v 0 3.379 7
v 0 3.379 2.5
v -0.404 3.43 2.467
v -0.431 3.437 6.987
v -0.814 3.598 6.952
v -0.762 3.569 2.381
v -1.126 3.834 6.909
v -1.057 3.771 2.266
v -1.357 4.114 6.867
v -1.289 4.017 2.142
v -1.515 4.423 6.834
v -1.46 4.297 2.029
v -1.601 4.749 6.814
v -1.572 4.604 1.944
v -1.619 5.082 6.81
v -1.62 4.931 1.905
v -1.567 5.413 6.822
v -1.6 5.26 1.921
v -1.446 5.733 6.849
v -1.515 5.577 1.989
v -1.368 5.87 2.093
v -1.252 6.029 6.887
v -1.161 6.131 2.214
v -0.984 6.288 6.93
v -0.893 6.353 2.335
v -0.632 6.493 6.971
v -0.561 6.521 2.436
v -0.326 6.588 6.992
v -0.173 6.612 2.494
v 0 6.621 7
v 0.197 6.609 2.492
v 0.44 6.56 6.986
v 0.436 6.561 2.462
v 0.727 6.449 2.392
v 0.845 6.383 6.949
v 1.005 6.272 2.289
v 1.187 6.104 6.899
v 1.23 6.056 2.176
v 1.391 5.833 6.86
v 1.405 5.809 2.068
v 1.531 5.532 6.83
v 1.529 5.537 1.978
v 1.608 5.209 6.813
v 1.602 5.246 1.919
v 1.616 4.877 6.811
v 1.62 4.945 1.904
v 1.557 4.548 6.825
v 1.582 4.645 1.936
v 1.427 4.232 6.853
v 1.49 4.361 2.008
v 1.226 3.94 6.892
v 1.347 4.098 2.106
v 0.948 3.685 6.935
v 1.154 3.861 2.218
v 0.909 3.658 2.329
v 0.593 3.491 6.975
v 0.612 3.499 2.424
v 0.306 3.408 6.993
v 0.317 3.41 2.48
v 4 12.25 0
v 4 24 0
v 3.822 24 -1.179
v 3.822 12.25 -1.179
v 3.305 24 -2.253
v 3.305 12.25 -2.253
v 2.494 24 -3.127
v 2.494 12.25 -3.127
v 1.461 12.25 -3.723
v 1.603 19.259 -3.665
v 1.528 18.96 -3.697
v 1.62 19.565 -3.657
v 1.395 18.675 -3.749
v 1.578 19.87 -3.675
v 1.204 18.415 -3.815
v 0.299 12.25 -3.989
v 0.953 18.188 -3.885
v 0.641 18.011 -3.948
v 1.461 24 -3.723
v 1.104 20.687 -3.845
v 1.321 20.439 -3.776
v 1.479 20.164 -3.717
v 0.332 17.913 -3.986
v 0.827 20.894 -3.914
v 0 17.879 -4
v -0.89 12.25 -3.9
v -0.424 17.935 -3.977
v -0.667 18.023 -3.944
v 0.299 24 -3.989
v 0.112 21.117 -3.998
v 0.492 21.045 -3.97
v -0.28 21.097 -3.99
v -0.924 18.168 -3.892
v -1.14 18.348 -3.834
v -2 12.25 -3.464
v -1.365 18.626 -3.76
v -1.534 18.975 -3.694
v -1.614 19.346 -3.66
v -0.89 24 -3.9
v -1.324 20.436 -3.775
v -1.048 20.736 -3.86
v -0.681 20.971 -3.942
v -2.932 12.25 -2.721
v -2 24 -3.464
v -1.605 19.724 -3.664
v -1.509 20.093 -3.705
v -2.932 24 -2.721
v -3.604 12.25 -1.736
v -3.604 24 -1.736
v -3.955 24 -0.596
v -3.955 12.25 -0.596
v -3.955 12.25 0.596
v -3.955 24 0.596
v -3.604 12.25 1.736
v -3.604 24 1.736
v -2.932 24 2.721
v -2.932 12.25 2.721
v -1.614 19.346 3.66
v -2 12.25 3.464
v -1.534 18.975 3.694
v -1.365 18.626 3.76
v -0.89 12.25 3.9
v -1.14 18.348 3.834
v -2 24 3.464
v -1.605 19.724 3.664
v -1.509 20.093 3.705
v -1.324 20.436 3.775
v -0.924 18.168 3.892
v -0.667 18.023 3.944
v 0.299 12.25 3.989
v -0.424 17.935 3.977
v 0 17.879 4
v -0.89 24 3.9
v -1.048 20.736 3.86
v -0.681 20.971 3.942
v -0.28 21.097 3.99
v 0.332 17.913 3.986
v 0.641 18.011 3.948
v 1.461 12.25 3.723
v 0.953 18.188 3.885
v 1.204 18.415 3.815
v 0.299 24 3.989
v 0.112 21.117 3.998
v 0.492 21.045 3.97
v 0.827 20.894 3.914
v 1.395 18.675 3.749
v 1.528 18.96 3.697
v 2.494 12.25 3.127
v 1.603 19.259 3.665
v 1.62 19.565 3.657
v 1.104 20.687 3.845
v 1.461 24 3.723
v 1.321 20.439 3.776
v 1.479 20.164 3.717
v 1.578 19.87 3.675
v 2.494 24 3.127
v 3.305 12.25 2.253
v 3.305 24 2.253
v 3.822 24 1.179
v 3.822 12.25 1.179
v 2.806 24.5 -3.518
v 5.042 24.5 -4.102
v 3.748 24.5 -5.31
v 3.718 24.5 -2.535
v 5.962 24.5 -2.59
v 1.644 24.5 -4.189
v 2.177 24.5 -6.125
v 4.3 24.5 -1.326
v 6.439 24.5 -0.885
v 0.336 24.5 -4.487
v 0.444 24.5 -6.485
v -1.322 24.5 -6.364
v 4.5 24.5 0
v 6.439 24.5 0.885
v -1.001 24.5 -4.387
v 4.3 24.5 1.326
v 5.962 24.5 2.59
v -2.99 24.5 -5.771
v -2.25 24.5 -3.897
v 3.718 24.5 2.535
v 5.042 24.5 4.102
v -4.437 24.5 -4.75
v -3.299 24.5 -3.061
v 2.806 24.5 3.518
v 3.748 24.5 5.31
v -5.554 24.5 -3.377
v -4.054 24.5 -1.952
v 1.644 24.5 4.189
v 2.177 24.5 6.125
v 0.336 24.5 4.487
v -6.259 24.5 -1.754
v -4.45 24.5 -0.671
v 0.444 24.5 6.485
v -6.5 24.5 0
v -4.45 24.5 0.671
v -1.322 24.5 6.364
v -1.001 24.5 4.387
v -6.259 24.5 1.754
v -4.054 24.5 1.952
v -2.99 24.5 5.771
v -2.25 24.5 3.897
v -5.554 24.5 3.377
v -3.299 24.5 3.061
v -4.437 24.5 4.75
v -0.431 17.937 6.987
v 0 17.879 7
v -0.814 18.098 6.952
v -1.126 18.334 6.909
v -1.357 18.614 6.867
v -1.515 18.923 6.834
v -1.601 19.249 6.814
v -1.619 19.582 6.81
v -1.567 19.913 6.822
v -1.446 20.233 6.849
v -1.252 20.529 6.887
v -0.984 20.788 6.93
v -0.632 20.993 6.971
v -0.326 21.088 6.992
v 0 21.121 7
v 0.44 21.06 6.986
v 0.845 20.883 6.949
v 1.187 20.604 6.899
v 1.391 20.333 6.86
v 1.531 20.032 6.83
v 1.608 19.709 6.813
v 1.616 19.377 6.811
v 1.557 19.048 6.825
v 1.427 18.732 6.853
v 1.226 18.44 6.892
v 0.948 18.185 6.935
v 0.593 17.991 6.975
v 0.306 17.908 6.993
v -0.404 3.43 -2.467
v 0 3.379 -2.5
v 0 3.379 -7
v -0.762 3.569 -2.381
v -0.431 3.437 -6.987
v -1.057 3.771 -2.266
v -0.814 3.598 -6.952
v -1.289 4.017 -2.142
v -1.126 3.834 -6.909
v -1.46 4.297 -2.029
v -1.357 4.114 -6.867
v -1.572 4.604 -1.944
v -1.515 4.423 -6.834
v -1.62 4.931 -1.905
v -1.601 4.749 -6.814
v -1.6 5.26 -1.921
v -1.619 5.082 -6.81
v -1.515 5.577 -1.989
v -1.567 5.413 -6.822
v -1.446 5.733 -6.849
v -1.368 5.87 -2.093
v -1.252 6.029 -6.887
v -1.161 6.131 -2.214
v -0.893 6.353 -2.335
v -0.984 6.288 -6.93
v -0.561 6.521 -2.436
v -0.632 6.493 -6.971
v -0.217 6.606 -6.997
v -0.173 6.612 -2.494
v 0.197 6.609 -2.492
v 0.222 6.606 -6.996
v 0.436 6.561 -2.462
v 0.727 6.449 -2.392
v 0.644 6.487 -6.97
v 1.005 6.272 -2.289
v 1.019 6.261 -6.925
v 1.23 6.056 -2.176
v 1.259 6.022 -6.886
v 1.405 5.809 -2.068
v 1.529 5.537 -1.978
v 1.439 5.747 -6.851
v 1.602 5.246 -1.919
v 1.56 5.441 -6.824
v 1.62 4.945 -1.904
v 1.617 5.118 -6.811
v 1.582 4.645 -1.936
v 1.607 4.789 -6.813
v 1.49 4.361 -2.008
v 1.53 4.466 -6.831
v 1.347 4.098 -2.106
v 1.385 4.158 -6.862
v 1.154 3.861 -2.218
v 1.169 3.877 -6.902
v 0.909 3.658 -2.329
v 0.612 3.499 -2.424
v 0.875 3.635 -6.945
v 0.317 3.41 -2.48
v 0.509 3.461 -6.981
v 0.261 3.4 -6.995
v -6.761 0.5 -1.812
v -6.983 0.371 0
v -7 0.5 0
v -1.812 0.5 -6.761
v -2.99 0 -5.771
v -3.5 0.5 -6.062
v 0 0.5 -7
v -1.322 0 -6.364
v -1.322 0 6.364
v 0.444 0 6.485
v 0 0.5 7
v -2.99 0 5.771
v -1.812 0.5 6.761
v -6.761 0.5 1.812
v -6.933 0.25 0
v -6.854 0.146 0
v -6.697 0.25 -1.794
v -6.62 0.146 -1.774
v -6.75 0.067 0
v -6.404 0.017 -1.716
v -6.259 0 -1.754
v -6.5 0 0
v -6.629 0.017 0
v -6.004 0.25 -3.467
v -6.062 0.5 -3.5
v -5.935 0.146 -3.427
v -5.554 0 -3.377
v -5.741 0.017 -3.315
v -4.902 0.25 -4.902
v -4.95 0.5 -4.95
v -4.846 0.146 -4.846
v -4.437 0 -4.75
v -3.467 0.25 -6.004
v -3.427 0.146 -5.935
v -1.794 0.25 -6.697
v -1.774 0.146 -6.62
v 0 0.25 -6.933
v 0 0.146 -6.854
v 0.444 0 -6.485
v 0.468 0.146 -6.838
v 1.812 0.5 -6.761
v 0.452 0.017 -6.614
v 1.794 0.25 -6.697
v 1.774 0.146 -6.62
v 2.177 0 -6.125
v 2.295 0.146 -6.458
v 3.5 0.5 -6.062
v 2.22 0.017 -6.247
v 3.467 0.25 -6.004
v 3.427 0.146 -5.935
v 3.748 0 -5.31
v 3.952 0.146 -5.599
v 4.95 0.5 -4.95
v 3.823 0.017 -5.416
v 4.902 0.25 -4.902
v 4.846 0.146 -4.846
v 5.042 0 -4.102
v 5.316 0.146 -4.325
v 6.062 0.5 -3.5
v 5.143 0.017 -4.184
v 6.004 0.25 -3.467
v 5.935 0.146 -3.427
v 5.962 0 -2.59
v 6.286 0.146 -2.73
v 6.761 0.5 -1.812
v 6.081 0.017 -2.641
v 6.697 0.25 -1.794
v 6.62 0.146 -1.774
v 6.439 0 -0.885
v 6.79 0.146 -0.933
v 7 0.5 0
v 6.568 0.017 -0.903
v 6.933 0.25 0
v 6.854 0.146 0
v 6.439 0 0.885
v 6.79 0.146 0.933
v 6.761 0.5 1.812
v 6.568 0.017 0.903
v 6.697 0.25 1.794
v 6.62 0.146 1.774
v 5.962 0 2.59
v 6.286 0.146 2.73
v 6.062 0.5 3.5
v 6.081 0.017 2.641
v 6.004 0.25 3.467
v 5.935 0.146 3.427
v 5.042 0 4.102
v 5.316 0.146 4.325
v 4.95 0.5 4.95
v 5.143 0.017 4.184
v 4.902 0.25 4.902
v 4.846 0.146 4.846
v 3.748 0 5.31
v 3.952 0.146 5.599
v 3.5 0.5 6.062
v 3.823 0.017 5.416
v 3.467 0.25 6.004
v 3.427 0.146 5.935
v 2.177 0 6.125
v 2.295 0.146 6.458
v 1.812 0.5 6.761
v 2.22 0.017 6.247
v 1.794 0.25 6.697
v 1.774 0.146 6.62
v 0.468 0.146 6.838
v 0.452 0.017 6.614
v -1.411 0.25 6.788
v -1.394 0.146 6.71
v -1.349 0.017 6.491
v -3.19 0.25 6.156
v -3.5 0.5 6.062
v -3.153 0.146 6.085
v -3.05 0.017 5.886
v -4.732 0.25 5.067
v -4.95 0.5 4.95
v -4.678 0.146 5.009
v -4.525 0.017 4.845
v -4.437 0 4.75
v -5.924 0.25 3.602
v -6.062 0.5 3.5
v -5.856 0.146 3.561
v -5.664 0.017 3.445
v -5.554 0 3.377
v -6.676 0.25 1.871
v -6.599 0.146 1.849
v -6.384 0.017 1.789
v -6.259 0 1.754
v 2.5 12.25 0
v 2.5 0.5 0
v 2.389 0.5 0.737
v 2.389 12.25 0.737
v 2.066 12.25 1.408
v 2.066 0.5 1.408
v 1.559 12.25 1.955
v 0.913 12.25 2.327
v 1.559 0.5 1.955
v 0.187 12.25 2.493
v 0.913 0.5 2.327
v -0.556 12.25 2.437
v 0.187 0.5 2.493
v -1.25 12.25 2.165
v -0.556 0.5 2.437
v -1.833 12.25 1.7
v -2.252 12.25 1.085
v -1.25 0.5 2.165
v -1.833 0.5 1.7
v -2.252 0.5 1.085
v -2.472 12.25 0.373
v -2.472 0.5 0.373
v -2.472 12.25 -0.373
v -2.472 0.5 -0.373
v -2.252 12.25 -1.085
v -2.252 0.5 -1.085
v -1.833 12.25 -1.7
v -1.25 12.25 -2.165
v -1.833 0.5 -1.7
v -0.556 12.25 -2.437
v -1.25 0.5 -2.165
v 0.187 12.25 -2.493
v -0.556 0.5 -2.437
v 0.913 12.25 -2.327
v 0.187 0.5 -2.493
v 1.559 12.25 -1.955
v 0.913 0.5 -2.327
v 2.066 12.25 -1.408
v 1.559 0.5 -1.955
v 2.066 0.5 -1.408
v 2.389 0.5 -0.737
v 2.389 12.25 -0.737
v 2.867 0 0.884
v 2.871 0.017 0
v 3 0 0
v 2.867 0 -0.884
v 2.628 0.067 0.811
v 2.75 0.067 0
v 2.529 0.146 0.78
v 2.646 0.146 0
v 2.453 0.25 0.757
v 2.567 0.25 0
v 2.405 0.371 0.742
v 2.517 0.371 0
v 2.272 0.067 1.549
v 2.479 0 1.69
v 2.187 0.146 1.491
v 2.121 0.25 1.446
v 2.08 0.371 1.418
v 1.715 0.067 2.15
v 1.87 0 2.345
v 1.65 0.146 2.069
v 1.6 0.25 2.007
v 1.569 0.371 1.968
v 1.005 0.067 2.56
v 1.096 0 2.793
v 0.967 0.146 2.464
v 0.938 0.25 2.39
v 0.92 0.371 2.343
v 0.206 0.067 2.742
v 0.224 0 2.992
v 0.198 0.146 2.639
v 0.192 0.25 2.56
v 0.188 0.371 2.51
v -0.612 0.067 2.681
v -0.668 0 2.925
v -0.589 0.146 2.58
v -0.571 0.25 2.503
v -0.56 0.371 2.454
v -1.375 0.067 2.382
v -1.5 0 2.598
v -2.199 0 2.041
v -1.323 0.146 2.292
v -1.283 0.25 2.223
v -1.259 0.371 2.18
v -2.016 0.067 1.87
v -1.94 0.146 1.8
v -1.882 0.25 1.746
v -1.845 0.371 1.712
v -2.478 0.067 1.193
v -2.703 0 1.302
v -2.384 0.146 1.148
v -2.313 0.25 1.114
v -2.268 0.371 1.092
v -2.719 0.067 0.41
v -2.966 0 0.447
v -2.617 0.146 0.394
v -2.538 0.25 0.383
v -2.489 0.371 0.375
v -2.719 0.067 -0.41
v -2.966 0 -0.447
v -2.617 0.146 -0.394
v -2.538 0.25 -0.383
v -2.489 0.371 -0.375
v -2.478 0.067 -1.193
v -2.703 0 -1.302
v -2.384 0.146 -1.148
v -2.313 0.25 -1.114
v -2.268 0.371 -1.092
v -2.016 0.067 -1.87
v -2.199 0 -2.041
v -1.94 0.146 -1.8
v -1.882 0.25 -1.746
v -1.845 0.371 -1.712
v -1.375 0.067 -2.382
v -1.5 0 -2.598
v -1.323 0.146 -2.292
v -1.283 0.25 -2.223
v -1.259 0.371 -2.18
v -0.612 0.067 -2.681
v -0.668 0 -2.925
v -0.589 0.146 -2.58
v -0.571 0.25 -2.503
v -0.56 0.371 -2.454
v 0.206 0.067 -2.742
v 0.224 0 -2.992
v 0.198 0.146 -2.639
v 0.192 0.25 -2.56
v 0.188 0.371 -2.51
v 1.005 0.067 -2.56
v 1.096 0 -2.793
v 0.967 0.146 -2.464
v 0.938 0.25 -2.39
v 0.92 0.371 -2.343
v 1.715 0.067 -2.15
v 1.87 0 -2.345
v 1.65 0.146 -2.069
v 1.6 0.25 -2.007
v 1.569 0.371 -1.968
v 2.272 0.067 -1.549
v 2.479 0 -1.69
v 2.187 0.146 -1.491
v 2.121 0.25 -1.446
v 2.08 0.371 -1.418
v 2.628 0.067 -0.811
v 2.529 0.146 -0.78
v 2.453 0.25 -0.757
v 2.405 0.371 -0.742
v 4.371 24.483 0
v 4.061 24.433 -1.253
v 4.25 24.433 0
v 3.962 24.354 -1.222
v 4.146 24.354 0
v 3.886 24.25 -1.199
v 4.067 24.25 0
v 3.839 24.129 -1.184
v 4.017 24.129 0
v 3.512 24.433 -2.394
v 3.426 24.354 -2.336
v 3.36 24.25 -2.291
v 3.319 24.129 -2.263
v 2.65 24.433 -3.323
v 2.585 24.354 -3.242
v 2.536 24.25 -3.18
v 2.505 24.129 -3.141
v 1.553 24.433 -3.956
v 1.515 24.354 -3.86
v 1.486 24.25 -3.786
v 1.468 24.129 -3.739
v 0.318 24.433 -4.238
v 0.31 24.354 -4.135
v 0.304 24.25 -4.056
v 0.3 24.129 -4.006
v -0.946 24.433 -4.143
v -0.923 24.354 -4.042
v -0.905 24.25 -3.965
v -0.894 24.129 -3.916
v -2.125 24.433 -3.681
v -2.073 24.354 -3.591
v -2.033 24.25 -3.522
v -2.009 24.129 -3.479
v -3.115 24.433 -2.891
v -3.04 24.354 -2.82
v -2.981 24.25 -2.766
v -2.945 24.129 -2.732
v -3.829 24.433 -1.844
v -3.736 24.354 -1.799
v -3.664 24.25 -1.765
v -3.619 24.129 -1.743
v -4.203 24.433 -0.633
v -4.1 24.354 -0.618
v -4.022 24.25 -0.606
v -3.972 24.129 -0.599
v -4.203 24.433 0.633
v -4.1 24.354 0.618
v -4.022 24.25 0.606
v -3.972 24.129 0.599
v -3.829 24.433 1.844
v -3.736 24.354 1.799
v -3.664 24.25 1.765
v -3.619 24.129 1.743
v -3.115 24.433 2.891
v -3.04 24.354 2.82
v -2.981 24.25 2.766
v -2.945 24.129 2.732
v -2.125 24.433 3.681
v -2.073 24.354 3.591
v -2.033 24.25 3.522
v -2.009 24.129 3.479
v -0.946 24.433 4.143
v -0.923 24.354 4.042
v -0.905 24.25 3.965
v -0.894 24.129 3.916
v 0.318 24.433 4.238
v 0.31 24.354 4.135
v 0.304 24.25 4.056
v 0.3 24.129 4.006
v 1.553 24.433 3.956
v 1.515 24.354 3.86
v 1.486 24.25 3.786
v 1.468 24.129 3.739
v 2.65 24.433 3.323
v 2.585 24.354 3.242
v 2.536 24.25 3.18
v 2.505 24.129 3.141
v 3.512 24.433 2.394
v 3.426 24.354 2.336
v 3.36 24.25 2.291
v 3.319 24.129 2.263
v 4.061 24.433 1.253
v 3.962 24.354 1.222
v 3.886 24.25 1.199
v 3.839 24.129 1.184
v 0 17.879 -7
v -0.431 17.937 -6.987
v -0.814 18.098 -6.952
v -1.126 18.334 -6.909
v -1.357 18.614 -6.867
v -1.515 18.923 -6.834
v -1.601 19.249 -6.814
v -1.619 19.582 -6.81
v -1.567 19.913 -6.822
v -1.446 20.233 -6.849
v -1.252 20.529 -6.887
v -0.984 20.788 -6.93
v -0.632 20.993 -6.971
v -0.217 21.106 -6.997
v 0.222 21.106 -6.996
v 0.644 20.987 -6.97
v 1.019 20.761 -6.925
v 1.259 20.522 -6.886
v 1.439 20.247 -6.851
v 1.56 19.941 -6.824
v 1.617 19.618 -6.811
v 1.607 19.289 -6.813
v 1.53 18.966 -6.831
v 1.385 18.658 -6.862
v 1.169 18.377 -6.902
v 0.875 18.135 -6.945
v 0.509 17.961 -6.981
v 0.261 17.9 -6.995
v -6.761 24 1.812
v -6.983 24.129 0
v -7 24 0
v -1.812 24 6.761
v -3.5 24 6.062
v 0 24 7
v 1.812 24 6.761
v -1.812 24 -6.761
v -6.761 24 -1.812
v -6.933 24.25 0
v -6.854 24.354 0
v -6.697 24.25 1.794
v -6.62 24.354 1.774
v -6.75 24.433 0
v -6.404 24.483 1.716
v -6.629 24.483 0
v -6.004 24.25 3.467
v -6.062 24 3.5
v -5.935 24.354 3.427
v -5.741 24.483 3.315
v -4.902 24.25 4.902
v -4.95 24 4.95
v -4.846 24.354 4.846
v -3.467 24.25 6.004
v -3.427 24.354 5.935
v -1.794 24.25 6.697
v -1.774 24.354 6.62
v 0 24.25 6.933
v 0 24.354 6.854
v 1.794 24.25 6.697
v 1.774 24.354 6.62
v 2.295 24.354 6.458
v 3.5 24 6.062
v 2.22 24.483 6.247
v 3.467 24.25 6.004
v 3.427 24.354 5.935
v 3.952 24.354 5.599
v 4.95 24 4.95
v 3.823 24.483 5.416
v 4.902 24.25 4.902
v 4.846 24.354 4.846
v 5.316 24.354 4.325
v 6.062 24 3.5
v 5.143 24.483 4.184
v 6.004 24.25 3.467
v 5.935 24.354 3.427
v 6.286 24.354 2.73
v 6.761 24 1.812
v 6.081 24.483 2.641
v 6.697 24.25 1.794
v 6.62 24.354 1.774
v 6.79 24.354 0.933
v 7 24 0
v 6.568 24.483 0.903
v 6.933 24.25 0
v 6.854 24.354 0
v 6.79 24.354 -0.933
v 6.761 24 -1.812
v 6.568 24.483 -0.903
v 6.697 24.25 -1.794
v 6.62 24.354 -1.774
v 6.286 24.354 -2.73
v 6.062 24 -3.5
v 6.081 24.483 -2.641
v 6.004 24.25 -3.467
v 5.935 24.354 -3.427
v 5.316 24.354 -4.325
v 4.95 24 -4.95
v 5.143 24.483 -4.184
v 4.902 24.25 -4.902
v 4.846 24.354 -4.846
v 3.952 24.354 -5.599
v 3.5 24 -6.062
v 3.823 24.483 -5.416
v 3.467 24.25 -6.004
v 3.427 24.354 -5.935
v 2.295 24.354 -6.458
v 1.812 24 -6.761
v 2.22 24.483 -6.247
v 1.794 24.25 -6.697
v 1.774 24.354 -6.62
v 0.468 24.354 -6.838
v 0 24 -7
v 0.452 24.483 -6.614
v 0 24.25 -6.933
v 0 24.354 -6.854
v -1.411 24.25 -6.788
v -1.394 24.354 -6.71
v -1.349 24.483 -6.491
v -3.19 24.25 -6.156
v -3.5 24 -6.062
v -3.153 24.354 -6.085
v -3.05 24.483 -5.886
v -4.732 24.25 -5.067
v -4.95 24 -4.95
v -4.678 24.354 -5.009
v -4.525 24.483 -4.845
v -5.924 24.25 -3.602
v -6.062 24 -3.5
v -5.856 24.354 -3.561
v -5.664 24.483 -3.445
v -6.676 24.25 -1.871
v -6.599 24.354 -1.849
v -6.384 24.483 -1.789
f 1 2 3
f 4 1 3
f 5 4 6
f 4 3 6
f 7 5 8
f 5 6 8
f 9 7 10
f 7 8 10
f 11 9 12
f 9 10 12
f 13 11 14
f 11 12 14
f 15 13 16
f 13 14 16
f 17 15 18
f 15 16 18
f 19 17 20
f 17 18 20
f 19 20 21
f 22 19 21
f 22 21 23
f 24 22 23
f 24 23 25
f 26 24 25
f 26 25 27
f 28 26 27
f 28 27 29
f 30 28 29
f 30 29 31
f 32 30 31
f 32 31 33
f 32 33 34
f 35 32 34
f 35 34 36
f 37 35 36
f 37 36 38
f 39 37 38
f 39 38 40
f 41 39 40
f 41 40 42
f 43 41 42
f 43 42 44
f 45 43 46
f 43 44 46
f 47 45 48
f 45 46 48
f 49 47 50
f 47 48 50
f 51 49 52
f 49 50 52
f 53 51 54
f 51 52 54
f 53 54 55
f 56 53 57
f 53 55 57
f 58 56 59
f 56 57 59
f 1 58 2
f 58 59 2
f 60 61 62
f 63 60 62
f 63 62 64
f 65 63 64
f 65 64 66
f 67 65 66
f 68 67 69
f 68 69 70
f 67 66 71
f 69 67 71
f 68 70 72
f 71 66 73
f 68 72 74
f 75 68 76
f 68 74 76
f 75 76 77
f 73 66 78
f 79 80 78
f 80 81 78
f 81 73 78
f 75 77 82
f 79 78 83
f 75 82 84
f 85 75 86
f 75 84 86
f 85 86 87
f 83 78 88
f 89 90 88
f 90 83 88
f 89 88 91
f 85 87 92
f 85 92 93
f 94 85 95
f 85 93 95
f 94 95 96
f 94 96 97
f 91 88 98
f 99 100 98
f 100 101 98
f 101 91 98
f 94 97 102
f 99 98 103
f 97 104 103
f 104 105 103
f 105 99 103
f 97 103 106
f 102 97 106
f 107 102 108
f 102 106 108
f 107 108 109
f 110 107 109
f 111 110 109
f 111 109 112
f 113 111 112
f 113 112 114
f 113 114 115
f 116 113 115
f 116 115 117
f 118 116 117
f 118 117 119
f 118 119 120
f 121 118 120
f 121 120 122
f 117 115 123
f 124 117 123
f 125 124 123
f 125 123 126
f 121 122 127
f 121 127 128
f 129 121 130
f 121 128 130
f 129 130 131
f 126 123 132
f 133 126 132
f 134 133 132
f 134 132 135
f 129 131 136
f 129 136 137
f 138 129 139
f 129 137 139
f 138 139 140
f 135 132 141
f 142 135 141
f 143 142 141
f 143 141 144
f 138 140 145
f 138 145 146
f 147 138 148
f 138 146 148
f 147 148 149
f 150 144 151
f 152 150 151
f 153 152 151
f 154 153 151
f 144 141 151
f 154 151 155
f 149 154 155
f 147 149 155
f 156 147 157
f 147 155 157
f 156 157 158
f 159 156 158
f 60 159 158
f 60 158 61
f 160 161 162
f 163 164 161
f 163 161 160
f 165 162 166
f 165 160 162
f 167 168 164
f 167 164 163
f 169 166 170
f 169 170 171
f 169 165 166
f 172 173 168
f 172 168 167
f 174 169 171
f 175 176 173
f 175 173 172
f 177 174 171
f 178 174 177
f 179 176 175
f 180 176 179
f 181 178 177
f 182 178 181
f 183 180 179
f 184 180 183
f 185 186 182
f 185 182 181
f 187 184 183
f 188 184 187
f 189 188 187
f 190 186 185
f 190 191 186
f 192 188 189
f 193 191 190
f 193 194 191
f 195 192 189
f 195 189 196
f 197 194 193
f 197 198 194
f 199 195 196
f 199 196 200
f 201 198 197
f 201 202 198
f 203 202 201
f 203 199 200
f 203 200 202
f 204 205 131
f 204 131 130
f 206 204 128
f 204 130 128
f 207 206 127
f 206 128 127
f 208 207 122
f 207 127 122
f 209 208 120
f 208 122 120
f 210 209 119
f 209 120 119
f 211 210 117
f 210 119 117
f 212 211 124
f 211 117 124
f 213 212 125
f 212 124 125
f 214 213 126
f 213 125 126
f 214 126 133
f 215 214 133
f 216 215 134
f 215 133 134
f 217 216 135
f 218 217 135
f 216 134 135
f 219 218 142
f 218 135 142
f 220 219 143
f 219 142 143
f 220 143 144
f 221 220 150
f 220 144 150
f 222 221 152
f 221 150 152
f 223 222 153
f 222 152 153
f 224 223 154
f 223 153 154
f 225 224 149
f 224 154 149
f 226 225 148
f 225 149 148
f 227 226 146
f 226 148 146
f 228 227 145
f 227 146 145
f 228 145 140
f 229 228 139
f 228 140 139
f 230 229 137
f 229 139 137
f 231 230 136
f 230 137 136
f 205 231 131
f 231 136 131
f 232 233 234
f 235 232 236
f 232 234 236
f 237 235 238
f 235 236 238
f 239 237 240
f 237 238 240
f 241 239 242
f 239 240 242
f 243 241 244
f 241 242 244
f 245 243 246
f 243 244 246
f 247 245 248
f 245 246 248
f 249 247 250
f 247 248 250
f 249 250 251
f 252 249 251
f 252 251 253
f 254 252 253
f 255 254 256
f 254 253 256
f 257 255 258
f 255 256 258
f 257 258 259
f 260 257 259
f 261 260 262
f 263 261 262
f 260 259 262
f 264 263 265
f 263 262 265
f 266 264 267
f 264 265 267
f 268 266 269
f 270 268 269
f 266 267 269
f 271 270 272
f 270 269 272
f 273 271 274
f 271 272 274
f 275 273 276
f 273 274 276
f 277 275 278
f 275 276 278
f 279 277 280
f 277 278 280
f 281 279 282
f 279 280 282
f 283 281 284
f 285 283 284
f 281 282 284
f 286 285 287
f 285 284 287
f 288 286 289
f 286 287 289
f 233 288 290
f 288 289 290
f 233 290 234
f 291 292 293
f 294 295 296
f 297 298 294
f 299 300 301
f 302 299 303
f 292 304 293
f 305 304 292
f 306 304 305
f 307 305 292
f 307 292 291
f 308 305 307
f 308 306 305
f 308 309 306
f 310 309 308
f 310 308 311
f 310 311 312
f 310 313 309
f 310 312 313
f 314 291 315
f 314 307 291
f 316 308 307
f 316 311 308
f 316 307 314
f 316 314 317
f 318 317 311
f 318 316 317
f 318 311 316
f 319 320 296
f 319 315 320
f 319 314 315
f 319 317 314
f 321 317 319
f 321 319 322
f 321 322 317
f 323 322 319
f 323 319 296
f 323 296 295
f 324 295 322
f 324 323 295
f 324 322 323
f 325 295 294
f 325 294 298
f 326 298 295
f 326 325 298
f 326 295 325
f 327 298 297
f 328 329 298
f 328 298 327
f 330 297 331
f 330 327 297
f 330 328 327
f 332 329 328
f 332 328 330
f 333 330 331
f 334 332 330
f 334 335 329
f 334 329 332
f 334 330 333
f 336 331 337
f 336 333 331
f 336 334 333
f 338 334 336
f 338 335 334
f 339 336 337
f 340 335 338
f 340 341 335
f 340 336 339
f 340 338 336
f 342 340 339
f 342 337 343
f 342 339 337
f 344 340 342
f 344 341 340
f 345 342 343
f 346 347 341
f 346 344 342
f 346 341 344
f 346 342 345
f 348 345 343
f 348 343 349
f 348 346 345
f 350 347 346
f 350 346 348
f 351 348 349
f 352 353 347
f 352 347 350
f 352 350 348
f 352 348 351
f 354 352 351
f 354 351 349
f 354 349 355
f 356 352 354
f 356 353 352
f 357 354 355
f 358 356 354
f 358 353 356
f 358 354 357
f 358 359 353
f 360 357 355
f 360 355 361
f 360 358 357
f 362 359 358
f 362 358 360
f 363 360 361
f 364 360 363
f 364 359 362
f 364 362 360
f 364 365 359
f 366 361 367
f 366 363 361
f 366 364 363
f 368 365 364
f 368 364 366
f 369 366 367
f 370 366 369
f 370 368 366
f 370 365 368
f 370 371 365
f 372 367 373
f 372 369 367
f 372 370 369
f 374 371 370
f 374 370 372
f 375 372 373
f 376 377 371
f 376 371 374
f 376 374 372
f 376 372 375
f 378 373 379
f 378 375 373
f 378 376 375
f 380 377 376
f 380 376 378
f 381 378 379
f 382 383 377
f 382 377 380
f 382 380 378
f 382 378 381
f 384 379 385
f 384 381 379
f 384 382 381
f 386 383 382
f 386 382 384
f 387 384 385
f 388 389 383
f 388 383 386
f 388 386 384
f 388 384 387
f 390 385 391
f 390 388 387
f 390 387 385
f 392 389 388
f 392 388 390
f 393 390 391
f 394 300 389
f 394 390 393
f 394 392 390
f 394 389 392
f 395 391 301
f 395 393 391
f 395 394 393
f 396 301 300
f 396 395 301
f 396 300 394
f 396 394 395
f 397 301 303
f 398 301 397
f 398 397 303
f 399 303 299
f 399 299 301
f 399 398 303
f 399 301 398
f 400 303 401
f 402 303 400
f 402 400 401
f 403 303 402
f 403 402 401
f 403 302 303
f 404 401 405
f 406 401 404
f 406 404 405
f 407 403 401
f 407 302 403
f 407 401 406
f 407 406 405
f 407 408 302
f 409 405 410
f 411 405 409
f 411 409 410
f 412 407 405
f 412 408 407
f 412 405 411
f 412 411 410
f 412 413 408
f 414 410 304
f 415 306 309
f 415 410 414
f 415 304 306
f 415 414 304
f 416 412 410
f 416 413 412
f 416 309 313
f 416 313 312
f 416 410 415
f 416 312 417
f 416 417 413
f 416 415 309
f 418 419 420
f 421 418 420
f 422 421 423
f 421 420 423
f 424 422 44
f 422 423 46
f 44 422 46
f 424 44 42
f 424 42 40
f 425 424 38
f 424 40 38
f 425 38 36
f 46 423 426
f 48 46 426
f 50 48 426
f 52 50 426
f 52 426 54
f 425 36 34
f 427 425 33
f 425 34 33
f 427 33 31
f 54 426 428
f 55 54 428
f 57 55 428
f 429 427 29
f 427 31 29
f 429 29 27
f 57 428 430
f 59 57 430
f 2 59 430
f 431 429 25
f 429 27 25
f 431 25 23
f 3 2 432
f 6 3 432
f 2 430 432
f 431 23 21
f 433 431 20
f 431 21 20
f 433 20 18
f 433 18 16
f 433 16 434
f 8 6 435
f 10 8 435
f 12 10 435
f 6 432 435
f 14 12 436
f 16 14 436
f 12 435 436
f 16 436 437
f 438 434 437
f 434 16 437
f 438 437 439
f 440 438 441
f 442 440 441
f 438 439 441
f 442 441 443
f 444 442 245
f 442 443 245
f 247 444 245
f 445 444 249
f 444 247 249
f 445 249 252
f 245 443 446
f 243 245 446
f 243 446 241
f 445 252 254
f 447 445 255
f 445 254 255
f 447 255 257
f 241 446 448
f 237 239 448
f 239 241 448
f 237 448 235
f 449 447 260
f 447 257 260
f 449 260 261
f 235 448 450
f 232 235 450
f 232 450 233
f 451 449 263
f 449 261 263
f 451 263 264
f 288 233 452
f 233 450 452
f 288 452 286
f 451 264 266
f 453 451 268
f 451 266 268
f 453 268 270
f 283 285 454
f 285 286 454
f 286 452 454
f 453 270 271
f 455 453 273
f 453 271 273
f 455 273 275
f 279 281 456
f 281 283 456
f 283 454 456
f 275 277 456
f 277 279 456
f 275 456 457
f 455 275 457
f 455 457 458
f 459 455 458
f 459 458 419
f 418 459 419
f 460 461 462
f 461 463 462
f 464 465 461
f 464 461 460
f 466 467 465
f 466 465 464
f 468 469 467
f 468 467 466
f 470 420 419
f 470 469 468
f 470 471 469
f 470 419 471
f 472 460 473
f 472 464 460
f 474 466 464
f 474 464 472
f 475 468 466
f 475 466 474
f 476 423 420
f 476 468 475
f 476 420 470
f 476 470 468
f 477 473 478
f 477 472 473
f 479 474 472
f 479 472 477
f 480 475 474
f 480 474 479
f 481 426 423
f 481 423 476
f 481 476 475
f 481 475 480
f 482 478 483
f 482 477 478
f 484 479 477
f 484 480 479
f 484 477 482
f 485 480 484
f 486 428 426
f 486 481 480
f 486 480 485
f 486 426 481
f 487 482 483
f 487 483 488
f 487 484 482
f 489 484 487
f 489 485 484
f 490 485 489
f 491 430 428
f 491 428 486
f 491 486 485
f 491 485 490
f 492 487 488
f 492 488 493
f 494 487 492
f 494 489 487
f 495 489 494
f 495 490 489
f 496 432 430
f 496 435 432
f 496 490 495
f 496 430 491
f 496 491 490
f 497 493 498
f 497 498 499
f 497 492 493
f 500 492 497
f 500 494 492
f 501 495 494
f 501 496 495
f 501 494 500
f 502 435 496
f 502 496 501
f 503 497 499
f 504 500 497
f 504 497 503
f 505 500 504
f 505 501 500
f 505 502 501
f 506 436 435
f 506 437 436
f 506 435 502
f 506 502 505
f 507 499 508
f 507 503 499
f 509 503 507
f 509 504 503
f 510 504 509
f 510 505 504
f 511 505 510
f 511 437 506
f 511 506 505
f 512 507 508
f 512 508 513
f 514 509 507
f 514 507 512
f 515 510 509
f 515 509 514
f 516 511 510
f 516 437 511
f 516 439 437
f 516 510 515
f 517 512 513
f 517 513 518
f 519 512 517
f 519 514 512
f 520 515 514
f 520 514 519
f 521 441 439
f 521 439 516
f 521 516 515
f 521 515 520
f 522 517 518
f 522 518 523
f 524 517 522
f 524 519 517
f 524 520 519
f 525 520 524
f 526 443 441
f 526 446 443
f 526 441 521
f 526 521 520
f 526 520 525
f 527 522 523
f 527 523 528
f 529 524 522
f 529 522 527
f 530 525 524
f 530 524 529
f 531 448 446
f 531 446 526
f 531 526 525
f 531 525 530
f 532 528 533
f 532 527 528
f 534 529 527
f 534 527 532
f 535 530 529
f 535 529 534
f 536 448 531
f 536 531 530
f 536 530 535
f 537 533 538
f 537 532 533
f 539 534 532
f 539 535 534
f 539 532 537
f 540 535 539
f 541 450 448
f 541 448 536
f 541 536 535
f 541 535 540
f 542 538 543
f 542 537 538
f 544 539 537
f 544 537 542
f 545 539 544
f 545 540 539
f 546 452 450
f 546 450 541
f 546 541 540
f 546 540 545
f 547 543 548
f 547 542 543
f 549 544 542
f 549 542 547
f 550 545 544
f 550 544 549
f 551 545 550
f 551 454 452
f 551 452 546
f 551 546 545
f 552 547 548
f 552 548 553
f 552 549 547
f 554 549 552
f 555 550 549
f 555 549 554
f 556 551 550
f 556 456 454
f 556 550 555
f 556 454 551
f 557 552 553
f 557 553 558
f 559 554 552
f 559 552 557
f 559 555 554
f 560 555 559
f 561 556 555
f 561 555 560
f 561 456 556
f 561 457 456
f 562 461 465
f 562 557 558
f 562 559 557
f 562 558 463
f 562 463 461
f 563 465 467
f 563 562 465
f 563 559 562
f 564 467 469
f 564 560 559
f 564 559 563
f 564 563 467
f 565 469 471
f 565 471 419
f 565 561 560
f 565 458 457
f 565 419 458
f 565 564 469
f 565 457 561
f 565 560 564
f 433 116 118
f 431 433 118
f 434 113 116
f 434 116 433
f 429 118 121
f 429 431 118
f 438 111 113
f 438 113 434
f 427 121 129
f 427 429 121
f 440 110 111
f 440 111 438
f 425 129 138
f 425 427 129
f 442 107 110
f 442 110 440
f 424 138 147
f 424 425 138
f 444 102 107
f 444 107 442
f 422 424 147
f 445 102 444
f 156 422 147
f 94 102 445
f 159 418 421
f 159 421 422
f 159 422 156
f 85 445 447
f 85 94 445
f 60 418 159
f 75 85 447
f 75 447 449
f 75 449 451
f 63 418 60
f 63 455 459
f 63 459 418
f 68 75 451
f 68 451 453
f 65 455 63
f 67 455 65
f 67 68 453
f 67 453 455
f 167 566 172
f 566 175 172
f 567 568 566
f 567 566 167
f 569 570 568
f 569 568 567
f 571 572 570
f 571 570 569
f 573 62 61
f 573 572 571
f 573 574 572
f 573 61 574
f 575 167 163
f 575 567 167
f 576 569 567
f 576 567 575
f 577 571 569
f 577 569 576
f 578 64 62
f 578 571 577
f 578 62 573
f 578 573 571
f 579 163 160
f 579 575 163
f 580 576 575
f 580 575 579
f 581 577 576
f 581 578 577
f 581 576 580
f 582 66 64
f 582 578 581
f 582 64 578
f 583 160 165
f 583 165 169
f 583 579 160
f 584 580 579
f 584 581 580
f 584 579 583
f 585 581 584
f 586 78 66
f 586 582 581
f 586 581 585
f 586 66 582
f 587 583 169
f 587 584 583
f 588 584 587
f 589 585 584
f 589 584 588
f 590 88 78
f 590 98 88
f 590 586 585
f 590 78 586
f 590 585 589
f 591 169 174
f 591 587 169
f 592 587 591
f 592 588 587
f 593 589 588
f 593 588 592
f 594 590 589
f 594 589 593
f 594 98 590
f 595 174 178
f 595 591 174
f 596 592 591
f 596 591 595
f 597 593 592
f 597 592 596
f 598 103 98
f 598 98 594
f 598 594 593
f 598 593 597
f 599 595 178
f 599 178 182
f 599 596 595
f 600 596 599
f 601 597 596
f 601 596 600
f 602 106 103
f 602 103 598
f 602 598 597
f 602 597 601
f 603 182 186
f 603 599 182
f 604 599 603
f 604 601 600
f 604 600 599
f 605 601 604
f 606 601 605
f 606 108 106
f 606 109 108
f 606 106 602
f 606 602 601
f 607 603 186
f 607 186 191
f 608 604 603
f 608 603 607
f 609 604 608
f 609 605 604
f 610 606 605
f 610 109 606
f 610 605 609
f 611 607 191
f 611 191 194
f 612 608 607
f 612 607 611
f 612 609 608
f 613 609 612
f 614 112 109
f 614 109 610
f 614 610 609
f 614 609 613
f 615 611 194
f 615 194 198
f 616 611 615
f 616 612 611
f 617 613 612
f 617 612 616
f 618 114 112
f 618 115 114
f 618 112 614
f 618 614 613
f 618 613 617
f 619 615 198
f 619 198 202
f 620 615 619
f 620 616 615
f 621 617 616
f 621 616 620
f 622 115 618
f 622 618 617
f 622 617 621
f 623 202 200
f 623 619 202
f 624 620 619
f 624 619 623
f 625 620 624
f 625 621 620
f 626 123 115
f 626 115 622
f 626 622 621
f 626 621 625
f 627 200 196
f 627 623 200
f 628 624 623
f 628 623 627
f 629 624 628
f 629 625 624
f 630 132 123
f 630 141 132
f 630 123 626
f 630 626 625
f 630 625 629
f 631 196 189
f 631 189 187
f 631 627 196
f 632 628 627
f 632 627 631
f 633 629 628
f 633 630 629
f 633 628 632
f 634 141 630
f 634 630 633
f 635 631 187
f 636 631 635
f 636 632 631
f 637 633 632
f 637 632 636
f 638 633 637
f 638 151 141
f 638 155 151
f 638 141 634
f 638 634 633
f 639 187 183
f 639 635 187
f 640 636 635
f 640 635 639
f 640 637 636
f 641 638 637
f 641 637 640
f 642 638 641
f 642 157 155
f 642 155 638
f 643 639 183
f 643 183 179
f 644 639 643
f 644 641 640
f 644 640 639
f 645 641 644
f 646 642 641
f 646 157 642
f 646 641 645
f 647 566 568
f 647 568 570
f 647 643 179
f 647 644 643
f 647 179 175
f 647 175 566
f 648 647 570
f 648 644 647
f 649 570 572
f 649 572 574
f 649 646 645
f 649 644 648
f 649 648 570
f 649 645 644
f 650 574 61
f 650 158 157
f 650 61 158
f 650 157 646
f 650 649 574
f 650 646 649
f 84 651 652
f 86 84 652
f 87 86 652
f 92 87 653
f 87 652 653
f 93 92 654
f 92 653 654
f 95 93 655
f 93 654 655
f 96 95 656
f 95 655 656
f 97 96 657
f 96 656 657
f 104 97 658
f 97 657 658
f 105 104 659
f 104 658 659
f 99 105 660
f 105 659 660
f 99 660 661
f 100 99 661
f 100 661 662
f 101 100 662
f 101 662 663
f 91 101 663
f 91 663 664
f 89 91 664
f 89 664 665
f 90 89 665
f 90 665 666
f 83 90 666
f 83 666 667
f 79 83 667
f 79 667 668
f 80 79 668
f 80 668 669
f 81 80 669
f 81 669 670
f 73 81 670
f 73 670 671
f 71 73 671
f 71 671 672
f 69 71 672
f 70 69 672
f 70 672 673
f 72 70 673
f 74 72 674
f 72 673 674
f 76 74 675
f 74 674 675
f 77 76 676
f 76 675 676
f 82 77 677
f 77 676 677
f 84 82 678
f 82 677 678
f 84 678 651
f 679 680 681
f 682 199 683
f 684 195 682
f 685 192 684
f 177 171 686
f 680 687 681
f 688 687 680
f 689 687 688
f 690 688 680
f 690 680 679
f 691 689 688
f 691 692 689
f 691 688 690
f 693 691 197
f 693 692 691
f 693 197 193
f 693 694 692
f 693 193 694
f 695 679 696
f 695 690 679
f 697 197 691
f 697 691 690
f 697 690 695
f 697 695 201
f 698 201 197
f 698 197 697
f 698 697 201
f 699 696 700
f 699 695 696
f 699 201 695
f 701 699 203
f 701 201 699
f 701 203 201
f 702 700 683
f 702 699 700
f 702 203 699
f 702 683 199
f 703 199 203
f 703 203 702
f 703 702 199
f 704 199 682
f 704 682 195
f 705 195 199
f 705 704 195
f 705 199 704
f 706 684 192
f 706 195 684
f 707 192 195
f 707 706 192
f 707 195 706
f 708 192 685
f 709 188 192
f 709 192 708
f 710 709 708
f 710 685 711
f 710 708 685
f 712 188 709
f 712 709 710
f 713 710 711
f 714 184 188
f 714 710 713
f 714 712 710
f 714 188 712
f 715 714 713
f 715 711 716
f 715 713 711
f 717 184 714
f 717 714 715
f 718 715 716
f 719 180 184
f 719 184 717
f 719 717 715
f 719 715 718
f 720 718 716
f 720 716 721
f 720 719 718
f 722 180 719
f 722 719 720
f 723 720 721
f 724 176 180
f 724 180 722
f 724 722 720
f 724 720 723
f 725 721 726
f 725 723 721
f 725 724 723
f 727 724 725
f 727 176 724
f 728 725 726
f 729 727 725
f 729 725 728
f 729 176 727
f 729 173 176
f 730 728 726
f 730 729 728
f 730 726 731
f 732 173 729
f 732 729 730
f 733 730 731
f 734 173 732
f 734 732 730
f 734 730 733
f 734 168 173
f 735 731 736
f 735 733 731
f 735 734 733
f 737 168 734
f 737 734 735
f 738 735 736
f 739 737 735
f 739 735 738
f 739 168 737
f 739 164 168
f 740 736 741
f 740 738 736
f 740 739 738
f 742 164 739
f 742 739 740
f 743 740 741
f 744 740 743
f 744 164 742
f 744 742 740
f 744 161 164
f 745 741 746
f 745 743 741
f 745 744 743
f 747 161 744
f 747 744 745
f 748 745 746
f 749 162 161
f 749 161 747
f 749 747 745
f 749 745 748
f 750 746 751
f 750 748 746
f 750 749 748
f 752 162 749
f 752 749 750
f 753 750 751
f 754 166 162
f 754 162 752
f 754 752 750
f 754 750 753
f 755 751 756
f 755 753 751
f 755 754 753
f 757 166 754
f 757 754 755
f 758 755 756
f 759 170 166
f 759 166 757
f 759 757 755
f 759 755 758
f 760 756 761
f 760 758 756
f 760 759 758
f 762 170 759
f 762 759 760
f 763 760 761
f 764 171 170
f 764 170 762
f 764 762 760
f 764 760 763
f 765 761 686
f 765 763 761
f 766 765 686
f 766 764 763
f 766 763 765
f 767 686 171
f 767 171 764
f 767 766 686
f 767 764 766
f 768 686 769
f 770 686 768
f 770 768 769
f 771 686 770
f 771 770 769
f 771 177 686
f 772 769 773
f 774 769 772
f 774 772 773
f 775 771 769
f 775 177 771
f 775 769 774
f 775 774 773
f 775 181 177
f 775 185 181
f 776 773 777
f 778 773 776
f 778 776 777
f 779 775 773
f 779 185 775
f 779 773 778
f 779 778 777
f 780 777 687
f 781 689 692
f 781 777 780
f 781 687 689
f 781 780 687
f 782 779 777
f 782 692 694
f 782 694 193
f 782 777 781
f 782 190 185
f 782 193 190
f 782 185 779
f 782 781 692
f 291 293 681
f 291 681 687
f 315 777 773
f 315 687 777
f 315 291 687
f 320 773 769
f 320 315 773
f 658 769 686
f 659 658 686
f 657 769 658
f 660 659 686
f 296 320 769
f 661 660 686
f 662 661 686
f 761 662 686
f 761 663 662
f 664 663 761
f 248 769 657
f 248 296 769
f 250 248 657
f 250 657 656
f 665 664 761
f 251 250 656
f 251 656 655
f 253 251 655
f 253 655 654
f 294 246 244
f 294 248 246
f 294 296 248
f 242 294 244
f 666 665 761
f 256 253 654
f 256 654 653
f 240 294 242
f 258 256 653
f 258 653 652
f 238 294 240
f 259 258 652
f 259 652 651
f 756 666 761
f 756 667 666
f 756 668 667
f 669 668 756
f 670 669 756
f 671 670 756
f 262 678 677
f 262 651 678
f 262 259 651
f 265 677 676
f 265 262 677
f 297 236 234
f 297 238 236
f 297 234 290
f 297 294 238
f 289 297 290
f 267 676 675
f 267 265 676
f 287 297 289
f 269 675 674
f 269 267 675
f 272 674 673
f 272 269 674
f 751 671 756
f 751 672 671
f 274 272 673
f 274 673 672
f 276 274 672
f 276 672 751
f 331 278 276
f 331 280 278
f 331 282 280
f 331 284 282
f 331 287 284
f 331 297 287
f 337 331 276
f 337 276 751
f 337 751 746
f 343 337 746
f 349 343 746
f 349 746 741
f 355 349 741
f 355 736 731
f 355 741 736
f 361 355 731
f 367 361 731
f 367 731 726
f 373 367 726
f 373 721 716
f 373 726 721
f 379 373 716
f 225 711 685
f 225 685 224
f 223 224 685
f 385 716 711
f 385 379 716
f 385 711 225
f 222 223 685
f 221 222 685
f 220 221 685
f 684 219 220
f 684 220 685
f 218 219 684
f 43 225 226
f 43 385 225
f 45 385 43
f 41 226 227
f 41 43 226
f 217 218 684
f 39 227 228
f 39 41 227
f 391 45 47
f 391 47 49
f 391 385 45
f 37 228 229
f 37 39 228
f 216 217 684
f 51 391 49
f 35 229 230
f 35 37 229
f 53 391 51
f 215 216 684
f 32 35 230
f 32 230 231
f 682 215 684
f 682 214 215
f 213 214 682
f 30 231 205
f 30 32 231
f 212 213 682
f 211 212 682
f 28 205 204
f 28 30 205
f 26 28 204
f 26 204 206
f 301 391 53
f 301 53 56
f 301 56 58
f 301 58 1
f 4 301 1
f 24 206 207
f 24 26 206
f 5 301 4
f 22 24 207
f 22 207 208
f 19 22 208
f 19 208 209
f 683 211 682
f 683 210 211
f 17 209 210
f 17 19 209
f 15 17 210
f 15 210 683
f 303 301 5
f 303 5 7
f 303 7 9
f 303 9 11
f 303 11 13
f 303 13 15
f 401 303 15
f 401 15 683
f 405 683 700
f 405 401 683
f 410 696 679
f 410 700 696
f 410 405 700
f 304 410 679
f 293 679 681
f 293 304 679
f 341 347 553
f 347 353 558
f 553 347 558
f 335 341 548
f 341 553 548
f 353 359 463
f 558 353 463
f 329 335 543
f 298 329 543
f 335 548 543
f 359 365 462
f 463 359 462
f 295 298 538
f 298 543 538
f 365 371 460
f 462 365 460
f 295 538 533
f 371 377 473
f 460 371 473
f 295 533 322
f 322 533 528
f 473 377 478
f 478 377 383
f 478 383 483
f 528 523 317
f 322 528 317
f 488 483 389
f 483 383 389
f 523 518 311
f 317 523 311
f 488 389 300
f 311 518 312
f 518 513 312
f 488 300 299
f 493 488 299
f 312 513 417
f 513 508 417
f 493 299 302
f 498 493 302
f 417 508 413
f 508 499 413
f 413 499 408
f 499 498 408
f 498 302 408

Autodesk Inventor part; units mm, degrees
ref_plane "YZ Plane" through (0, 0, 0) normal (1, 0, 0) x (0, 1, 0)
ref_plane "XZ Plane" through (0, 0, 0) normal (0, 1, 0) x (-1, 0, 0)
sketch "Sketch1" plane through (0, 0, 0) normal (0, 1, 0) x (-1, 0, 0)
  circle A0 centre (0, 0) radius 7
  dimension "d0" = 14
extrude "Extrusion1" add sketch "Sketch1" along normal blind 24.5
sketch "Sketch2" plane through (0, 24.5, 0) normal (0, 1, 0) x (1, 0, 0)
  circle A0 centre (0, 0) radius 4
  dimension "d3" = 8
extrude "Extrusion2" cut sketch "Sketch2" against normal blind 12.25
sketch "Sketch3" plane through (0, 0, 0) normal (0, -1, 0) x (1, 0, 0)
  circle A0 centre (0, 0) radius 2.5
  dimension "d6" = 5
extrude "Extrusion3" cut sketch "Sketch3" against normal blind 12.25
fillet "Fillet1" radius 0.5 4 edges at (7, 24.5, 0) (7, 0, 0) (-4, 24.5, 0) (-2.5, 0, 0)
ref_plane "Work Plane4" through (0, 0, 7) normal (0, 0, 1) x (1, 0, 0)
sketch "Sketch8" plane through (0, 0, 7) normal (0, 0, 1) x (1, 0, 0)
  line L0 (0, 0) -> (0, 24.5) construction
  circle A0 centre (0, 5) radius 1.5
  circle A1 centre (0, 19.5) radius 1.5
  line L1 (-6.5, 24.5) -> (6.5, 24.5) projected
  dimension "d33" = 3
  dimension "d34" = 5
  dimension "d38" = 5
hole "Hole3" at (0, 5, 7) at (0, 19.5, 7) direction (0, 0, -1) diameter 3.242 end through all thread size "M4x0.7" class "6H" standard "ISO Metric profile"
properties part number "Rigid_Coupler" material "Aluminum 6061"
